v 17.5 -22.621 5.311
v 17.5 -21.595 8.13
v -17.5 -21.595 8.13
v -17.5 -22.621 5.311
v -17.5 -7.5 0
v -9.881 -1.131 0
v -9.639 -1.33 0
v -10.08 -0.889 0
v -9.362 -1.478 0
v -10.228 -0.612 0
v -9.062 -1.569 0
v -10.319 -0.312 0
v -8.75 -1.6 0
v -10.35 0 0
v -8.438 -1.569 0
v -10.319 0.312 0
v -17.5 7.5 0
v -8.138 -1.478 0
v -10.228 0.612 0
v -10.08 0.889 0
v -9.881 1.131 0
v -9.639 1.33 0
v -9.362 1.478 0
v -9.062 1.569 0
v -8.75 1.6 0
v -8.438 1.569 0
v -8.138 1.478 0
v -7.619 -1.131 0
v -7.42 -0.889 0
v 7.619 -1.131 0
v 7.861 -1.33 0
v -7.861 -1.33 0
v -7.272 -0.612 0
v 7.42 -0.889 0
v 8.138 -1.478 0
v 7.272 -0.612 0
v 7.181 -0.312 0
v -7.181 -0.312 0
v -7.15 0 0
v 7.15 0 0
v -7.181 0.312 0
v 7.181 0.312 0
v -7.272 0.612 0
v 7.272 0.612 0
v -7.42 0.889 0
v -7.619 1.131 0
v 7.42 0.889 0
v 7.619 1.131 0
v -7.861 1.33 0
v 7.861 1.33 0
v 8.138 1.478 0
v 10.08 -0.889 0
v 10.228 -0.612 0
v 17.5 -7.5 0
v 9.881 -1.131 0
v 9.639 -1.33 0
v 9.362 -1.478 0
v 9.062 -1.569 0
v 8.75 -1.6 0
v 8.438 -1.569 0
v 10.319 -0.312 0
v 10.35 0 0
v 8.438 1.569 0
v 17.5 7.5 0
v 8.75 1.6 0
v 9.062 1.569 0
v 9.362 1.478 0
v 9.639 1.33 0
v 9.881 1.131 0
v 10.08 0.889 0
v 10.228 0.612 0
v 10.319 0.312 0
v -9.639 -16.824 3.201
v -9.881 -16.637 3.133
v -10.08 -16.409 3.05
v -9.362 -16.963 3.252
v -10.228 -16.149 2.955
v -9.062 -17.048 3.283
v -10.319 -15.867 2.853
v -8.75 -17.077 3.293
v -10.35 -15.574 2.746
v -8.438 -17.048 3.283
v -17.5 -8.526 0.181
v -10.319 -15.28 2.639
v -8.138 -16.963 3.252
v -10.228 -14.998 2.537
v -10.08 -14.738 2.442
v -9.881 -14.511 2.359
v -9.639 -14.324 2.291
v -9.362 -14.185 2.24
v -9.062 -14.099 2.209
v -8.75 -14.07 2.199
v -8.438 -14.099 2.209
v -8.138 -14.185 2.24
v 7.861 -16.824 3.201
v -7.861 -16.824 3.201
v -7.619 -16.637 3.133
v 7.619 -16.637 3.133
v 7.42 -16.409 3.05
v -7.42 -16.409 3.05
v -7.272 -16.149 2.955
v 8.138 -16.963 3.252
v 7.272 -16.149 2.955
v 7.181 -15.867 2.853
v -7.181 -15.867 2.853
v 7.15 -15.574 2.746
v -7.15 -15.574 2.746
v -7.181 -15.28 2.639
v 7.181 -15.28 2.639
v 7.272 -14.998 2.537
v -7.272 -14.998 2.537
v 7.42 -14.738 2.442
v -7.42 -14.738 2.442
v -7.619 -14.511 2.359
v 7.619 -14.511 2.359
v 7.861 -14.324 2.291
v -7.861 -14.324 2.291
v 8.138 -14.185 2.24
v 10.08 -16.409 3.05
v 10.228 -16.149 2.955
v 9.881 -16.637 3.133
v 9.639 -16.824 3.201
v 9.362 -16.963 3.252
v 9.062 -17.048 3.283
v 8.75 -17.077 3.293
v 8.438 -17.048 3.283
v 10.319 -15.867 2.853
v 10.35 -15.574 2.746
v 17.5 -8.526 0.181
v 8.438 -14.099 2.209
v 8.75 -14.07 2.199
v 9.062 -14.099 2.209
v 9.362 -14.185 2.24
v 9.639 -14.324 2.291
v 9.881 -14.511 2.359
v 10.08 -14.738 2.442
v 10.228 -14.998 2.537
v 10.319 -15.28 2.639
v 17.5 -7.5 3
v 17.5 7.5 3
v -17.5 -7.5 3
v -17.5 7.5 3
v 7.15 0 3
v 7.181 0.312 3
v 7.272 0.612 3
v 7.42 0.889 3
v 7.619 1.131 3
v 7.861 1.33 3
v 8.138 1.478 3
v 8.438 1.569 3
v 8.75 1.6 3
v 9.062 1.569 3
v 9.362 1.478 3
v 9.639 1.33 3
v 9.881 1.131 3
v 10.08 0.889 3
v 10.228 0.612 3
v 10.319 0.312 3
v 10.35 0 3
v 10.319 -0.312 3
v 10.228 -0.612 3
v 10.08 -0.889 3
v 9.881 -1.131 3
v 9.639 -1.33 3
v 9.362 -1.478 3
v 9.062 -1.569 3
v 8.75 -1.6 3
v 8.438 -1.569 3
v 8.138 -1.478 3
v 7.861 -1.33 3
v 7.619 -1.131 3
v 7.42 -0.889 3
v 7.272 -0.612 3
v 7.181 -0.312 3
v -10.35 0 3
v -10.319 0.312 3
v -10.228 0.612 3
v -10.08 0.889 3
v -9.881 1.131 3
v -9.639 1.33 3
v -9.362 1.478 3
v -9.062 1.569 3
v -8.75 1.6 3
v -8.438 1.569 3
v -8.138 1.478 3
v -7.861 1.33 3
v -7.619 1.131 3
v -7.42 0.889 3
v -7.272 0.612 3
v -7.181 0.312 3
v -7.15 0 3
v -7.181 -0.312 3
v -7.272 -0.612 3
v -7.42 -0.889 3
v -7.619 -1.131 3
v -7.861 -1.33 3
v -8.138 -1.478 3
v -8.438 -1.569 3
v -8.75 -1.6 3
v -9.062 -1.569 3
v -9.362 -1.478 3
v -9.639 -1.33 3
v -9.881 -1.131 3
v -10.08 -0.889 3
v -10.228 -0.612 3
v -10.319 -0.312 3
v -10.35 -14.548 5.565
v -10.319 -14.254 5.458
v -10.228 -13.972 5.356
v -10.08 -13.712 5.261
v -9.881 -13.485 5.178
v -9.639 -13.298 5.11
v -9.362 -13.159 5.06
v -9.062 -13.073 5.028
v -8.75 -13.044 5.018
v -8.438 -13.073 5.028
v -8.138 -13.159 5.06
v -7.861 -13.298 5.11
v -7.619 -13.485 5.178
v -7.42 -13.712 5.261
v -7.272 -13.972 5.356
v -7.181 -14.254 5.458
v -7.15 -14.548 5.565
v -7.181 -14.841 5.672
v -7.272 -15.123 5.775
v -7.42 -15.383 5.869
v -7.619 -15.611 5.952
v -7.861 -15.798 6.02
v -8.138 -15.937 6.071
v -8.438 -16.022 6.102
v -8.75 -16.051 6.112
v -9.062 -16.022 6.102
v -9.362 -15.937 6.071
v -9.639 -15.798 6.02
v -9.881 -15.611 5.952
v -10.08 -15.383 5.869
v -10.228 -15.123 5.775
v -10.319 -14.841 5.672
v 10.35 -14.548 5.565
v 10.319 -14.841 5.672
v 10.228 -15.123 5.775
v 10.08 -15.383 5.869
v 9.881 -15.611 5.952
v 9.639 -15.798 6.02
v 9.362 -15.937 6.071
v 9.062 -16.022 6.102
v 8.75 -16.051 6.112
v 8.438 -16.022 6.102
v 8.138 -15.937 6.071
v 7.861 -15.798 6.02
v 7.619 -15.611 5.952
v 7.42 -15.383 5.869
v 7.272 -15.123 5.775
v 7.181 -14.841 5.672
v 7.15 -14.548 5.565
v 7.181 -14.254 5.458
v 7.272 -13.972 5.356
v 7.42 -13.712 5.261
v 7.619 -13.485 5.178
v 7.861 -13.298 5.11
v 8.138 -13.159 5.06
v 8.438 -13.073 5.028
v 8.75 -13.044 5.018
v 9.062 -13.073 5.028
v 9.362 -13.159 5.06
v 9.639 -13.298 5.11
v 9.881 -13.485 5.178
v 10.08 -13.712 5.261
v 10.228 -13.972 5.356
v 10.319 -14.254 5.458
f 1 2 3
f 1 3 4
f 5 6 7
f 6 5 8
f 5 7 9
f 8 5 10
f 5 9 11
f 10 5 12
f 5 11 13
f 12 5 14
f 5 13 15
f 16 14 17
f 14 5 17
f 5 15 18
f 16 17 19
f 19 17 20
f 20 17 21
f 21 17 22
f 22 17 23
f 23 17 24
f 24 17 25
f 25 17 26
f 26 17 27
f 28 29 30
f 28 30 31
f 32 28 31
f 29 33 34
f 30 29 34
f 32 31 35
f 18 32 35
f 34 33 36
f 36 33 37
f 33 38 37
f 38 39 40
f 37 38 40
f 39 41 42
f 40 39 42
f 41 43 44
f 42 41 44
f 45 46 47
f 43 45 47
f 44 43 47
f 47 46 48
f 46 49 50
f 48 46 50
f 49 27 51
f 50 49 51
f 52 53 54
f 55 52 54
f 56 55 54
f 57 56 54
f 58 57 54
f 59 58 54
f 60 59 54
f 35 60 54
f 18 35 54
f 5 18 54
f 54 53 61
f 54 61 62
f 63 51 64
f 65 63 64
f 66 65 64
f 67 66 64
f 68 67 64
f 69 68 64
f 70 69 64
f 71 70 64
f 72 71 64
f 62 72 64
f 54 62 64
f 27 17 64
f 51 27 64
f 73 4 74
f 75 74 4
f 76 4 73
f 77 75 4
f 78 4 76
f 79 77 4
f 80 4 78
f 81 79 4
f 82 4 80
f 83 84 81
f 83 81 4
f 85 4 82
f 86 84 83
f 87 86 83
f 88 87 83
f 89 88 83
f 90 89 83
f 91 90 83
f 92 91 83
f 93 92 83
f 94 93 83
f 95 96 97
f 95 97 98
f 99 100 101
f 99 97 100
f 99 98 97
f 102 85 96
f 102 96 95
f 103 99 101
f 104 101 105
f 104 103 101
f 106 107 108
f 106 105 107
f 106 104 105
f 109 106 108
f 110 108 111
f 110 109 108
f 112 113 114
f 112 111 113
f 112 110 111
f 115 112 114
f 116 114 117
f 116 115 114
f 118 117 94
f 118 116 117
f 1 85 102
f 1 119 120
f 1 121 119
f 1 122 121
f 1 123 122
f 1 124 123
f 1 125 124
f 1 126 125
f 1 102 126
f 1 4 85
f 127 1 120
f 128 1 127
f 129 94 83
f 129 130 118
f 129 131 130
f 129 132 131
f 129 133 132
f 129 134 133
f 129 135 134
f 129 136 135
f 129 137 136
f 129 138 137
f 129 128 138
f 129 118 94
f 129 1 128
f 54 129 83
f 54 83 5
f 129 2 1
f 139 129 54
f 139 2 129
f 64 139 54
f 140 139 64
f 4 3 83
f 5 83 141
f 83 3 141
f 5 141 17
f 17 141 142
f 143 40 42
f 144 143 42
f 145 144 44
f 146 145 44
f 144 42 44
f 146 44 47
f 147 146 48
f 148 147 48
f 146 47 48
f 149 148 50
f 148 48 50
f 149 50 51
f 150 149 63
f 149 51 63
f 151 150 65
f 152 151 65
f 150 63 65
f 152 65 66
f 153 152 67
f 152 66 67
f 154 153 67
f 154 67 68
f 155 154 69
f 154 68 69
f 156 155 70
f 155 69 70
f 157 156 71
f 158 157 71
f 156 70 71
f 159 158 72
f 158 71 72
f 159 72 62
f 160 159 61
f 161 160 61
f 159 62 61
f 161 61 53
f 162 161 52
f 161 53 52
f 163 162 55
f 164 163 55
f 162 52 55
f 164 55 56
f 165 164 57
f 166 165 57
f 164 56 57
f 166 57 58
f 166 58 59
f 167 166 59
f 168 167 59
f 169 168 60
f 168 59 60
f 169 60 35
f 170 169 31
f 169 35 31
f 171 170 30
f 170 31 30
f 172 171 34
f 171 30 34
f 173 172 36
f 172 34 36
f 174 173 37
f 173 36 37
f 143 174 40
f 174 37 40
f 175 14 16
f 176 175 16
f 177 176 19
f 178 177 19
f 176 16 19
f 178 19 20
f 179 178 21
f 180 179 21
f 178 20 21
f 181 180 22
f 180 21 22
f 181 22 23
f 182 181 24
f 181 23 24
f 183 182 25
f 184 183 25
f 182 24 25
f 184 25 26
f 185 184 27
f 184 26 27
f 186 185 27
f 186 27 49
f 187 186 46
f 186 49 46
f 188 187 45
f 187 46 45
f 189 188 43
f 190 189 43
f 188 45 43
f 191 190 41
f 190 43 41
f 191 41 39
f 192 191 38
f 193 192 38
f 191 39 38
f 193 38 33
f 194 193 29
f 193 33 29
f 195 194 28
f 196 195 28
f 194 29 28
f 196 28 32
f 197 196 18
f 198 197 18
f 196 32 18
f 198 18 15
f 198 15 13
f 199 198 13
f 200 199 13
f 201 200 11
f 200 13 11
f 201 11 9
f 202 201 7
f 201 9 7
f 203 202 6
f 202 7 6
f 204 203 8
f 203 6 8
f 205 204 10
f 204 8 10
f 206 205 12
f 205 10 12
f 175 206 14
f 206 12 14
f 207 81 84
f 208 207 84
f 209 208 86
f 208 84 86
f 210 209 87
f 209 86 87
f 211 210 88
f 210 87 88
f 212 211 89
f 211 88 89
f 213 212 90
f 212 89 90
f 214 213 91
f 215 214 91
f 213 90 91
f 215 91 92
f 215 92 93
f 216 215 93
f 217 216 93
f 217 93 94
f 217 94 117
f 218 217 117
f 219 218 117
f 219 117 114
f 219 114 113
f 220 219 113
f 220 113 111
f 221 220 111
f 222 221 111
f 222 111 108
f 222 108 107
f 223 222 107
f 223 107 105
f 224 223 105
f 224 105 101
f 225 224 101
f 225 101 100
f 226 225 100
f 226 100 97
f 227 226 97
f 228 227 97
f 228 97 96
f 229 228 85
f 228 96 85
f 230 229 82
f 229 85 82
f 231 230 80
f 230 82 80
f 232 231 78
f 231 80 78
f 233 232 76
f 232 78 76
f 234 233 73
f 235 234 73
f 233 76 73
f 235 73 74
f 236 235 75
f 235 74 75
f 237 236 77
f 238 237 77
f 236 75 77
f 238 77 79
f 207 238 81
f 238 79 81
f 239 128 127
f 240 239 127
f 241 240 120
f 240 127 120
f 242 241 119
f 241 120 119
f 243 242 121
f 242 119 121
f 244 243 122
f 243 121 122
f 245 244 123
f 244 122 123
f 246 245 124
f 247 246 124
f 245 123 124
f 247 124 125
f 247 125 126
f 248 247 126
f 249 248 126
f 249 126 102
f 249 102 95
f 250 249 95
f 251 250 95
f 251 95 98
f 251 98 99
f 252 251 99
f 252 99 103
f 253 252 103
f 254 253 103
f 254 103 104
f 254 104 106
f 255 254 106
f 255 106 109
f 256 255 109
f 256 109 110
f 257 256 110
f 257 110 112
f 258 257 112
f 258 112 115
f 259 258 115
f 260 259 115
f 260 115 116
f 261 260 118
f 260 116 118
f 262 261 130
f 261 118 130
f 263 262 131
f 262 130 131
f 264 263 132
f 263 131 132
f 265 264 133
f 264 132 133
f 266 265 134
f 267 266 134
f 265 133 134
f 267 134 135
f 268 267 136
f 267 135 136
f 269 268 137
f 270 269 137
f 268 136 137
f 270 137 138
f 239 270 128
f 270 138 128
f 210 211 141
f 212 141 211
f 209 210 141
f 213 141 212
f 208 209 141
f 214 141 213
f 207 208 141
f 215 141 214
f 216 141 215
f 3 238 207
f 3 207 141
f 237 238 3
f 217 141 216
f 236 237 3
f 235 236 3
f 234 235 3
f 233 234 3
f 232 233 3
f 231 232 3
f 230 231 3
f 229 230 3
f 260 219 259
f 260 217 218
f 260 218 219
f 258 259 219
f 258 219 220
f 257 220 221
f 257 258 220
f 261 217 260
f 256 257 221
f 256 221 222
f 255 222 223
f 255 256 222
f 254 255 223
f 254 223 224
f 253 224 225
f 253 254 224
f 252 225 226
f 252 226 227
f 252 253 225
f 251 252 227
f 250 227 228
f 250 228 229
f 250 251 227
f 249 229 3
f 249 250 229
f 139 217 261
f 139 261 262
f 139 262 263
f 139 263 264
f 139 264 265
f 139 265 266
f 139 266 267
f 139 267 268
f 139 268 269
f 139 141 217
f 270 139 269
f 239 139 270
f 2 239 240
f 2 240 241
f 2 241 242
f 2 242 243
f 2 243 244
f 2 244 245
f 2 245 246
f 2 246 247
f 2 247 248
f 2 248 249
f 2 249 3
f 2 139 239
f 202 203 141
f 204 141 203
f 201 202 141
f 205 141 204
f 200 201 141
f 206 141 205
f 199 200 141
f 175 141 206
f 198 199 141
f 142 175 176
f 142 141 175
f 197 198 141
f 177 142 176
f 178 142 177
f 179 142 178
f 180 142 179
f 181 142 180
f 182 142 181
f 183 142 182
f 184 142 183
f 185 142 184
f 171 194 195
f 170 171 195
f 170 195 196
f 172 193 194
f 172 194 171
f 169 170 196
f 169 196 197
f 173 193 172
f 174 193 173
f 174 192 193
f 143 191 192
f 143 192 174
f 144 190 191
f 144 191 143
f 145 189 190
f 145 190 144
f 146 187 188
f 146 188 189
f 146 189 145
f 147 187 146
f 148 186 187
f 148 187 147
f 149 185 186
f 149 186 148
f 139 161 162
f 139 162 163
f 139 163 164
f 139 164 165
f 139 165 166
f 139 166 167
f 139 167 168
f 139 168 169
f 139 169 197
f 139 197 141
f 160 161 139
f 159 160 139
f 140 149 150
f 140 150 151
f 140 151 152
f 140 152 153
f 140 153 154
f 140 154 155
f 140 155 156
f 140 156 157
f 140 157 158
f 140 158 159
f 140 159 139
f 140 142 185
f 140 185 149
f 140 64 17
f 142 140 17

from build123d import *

# Parameters (mm, degrees)
F1_DEPTH = 3
F3_DEPTH = 35
F5_DEPTH = 25


with BuildPart() as f1:
    # F0 (on Top) → F1 (new body)
    with BuildSketch(Plane.XY):
        with BuildLine():
            Line((-17.5, 0), (-17.5, -7.5))
            Line((-17.5, -7.5), (17.5, -7.5))
            Line((17.5, -7.5), (17.5, 0))
            Line((17.5, 0), (10.35, 0))
            ThreePointArc((10.35, 0), (8.75, -1.6), (7.15, 0))
            Line((7.15, 0), (0, 0))
            Line((0, 0), (-7.15, 0))
            ThreePointArc((-7.15, 0), (-8.75, -1.6), (-10.35, 0))
            Line((-10.35, 0), (-17.5, 0))
        make_face()
        with BuildLine():
            Line((-17.5, 7.5), (-17.5, 0))
            Line((-17.5, 0), (-10.35, 0))
            ThreePointArc((-10.35, 0), (-8.75, 1.6), (-7.15, 0))
            Line((-7.15, 0), (0, 0))
            Line((0, 0), (7.15, 0))
            ThreePointArc((7.15, 0), (8.75, 1.6), (10.35, 0))
            Line((10.35, 0), (17.5, 0))
            Line((17.5, 0), (17.5, 7.5))
            Line((17.5, 7.5), (-17.5, 7.5))
        make_face()
    extrude(amount=F1_DEPTH)

    # F2 (on face) → F3 (join)
    with BuildSketch(Plane.YZ.offset(17.5)):
        Polygon((-8.52606043, 0.1809221376), (-7.5, 3), (-21.5953893118, 8.1303021499), (-22.6214497418, 5.3112242875), align=None)
        Polygon((-7.5, 0), (-7.5, 3), (-8.52606043, 0.1809221376), align=None)
    extrude(amount=-F3_DEPTH)

    # F4 (on face) → F5 (cut)
    with BuildSketch(Plane(origin=(0, -0.9392123538, -2.580464734), x_dir=(1, 0, 0), z_dir=(0, -0.3420201433, -0.9396926208))):
        with BuildLine():
            Line((10.35, 15.5737550859), (7.15, 15.5737550859))
            ThreePointArc((7.15, 15.5737550859), (8.75, 13.9737550859), (10.35, 15.5737550859))
        make_face()
        with BuildLine():
            ThreePointArc((10.35, 15.5737550859), (8.75, 17.1737550859), (7.15, 15.5737550859))
            Line((7.15, 15.5737550859), (10.35, 15.5737550859))
        make_face()
        with BuildLine():
            Line((-10.35, 15.5737550859), (-7.15, 15.5737550859))
            ThreePointArc((-7.15, 15.5737550859), (-8.75, 17.1737550859), (-10.35, 15.5737550859))
        make_face()
        with BuildLine():
            ThreePointArc((-10.35, 15.5737550859), (-8.75, 13.9737550859), (-7.15, 15.5737550859))
            Line((-7.15, 15.5737550859), (-10.35, 15.5737550859))
        make_face()
    extrude(amount=-F5_DEPTH, mode=Mode.SUBTRACT)


solid = f1.part
